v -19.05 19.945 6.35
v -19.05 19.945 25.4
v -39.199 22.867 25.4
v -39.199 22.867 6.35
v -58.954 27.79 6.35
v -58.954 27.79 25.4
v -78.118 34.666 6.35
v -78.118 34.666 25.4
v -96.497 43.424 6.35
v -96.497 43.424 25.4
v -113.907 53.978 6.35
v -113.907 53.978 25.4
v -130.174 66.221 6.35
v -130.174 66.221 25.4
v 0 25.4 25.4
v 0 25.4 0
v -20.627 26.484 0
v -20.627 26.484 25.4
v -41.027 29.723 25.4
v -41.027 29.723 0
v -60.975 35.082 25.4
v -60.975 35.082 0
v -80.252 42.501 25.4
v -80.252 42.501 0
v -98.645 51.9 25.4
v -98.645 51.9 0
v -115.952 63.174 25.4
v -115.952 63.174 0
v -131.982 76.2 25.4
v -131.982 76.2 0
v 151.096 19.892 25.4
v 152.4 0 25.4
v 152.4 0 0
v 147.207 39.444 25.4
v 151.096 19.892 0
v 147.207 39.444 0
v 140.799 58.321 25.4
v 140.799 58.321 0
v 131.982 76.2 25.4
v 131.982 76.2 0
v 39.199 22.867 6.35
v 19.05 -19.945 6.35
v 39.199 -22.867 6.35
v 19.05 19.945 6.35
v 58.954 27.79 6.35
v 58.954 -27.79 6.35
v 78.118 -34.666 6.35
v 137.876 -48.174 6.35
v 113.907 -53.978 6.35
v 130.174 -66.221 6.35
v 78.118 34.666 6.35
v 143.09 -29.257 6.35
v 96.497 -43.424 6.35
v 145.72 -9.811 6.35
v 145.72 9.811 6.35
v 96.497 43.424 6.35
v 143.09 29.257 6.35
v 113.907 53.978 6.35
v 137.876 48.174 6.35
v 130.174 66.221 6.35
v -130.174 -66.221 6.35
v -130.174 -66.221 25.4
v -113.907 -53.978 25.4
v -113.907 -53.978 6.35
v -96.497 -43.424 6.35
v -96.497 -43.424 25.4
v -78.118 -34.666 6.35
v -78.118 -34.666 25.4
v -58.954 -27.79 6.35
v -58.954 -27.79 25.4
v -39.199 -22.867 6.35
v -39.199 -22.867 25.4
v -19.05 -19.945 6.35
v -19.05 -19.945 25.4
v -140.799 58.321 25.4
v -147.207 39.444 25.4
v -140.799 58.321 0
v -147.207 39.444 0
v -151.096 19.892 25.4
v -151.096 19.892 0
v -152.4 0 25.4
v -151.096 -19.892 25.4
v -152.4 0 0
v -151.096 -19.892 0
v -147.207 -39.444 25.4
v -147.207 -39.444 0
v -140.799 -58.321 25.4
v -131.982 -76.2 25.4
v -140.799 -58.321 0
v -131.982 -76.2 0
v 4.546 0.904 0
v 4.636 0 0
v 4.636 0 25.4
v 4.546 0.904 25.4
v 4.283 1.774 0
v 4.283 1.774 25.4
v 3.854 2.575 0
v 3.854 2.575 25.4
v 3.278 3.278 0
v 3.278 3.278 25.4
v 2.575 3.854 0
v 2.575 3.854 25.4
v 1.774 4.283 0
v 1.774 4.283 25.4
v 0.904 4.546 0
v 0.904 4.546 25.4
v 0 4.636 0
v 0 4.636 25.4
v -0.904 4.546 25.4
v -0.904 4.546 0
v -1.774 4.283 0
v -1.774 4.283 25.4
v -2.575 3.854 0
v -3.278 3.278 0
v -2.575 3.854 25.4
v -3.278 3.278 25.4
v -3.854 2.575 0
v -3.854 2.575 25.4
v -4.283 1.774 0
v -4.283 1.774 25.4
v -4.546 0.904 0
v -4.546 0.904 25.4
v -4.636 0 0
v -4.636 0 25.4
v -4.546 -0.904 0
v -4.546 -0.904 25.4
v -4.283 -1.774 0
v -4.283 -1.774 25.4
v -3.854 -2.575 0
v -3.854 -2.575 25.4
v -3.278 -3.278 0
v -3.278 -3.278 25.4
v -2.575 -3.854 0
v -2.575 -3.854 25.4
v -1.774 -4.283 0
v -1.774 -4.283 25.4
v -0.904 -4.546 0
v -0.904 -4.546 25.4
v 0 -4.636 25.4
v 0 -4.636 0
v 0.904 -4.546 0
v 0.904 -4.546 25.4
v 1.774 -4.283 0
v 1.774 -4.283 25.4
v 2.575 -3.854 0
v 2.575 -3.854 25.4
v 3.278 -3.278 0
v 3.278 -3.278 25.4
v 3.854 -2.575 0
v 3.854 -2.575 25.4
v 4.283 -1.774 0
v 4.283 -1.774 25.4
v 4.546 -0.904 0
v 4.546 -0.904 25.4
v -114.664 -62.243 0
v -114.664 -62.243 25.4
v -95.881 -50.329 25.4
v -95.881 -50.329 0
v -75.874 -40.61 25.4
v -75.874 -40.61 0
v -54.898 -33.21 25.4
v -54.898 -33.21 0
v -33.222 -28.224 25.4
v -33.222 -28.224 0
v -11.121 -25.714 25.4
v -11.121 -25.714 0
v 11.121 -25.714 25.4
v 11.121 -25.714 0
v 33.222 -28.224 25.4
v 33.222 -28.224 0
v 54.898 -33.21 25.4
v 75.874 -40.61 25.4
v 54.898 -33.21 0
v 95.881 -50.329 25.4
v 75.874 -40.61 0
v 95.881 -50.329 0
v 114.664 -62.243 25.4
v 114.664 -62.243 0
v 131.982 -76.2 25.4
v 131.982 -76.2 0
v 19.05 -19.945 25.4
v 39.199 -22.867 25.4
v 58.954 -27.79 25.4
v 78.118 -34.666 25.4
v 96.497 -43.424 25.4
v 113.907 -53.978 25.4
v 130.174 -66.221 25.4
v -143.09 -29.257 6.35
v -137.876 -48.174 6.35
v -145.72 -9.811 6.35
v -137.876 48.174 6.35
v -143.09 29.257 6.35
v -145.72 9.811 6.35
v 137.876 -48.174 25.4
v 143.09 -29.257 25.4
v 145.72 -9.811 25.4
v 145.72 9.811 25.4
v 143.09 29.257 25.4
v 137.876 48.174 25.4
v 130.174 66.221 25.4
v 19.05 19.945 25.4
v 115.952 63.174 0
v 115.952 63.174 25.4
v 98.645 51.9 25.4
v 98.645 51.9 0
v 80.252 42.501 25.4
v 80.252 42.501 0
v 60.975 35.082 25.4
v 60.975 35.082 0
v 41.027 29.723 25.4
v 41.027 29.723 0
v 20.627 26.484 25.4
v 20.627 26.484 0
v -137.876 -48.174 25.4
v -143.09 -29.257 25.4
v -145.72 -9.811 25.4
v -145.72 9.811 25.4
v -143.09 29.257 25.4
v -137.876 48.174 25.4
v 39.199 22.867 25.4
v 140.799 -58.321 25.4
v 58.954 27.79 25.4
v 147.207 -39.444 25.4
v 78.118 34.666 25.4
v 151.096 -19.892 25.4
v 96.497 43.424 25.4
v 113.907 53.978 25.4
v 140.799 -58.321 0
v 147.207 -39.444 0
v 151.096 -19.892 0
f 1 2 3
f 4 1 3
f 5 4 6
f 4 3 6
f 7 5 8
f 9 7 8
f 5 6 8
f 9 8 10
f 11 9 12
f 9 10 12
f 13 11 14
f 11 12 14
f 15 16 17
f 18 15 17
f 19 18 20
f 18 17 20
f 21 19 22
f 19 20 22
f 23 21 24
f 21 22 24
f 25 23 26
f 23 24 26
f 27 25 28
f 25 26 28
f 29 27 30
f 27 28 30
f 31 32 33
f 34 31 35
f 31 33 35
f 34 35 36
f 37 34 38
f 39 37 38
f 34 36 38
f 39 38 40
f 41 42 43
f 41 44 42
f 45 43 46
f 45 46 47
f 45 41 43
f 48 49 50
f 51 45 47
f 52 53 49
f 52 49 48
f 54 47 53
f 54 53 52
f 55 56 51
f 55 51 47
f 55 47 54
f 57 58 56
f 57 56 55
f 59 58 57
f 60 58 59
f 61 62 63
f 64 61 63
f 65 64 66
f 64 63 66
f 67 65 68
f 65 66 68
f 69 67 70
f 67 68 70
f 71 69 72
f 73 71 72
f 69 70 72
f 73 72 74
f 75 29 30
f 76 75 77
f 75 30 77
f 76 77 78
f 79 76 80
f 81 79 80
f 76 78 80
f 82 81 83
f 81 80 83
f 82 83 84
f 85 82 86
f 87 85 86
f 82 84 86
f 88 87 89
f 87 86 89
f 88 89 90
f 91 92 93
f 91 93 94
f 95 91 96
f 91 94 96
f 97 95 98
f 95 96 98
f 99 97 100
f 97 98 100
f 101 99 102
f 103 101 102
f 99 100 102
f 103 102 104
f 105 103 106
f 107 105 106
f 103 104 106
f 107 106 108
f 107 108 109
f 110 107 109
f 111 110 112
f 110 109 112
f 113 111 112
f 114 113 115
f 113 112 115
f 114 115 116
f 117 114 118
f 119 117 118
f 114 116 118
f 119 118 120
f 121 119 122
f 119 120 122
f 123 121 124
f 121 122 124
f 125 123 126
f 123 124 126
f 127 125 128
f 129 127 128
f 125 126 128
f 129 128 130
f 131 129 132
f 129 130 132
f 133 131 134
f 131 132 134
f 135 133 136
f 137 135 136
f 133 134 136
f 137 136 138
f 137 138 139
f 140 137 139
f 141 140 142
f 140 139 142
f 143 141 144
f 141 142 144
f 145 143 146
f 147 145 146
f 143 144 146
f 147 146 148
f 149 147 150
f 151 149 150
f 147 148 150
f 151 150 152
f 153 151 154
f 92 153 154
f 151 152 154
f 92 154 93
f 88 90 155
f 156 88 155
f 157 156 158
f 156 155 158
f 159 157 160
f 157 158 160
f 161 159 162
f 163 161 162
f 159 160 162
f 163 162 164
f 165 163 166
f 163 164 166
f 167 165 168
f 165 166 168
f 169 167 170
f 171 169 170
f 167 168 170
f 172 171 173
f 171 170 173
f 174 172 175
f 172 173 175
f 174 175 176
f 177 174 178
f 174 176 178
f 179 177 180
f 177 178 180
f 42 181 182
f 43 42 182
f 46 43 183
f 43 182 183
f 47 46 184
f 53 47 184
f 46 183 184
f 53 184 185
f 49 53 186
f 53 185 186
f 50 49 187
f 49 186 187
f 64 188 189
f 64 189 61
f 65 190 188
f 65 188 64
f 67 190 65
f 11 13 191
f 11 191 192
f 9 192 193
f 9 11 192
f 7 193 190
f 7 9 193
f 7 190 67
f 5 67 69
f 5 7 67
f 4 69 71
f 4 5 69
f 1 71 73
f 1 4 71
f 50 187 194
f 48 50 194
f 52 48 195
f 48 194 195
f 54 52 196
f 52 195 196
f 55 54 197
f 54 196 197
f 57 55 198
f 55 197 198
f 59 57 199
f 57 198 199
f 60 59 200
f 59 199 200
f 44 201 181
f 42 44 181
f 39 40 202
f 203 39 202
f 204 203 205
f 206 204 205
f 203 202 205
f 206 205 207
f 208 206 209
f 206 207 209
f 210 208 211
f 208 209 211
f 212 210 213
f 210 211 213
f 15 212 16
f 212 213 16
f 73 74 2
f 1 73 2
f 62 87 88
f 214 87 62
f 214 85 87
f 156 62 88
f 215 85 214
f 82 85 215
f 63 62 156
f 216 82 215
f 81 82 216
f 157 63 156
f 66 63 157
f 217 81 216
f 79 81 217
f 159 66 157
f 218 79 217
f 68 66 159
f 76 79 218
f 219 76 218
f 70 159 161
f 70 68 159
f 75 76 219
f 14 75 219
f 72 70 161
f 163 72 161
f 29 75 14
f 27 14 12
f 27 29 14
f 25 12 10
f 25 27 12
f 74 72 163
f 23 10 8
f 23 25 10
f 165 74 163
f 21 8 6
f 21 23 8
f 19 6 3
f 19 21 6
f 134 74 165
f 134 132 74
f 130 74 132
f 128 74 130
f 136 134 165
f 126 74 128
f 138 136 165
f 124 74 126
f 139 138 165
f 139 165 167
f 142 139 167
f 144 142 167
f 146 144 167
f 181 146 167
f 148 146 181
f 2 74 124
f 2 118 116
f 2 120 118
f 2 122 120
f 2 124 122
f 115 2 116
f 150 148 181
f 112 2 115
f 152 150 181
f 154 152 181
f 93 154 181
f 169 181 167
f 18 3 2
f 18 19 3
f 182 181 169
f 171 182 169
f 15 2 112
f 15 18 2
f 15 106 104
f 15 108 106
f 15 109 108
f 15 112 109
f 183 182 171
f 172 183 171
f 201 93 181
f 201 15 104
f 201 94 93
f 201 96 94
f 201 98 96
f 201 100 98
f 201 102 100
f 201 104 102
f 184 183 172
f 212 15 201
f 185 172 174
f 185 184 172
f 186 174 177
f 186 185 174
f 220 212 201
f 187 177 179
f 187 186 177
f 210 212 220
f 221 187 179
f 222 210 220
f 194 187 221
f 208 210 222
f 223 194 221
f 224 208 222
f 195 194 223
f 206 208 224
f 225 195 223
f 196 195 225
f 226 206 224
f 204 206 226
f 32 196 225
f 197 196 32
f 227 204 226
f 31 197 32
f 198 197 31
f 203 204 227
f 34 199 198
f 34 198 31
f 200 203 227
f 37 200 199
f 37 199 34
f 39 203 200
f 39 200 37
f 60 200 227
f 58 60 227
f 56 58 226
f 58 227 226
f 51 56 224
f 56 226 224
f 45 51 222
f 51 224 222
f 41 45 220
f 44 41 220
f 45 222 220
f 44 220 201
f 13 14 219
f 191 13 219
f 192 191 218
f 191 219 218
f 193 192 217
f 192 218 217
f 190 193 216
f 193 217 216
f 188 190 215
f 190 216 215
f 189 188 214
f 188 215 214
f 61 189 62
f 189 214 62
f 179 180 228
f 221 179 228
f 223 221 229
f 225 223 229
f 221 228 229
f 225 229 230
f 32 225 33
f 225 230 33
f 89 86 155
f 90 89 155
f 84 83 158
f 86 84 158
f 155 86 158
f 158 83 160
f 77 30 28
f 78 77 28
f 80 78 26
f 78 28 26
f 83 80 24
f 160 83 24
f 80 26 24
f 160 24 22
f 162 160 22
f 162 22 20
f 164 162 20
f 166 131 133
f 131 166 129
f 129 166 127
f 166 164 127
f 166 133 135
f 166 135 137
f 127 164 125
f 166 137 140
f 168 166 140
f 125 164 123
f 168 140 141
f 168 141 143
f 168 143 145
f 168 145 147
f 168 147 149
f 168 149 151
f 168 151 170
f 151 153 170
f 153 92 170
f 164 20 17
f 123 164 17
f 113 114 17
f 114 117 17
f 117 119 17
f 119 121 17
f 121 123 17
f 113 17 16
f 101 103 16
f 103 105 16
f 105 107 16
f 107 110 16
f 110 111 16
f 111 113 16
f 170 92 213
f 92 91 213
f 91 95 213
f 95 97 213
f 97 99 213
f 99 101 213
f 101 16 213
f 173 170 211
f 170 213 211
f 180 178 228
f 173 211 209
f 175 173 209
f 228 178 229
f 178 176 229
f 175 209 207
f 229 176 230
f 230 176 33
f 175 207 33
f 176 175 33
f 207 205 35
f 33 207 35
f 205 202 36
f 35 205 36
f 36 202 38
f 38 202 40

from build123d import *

# Parameters (mm, degrees)
F1_DEPTH = 25.4
F3_DEPTH = 19.05
F4_R     = 4.6355
F5_DEPTH = 25.4


with BuildPart() as f1:
    # F0 (on Top) → F1 (new body)
    with BuildSketch(Plane.XY):
        with BuildLine():
            ThreePointArc((131.9822715367, -76.2), (147.2070959265, -39.4440224736), (152.4, 0))
            ThreePointArc((152.4, 0), (147.2070959265, 39.4440224736), (131.9822715368, 76.2))
            ThreePointArc((131.9822715367, 76.2), (70.7106074079, 38.5384530031), (0, 25.4))
            ThreePointArc((0, 25.4), (-70.7106074079, 38.5384530031), (-131.9822715367, 76.2))
            ThreePointArc((-131.9822715368, 76.2), (-152.4, 0), (-131.9822715367, -76.2))
            ThreePointArc((-131.9822715367, -76.2), (0, -25.4), (131.9822715367, -76.2))
        make_face()
    extrude(amount=F1_DEPTH)

    # F2 (on face) → F3 (cut)
    with BuildSketch(Plane.XY.offset(25.4)):
        with BuildLine():
            ThreePointArc((-19.05, 19.9449395097), (-78.1175048106, 34.6656311359), (-130.1742098035, 66.2214285714))
            ThreePointArc((-130.1742098035, 66.2214285714), (-146.05, 0), (-130.1742098035, -66.2214285714))
            ThreePointArc((-130.1742098035, -66.2214285714), (-78.1175048106, -34.6656311359), (-19.05, -19.9449395097))
            Line((-19.05, -19.9449395097), (-19.05, 0))
            Line((-19.05, 0), (-19.05, 19.9449395097))
        make_face()
        with BuildLine():
            ThreePointArc((19.05, -19.9449395097), (78.1175048106, -34.6656311359), (130.1742098035, -66.2214285714))
            ThreePointArc((130.1742098035, -66.2214285714), (146.05, 0), (130.1742098035, 66.2214285714))
            ThreePointArc((130.1742098035, 66.2214285714), (78.1175048106, 34.6656311359), (19.05, 19.9449395097))
            Line((19.05, 19.9449395097), (19.05, 0))
            Line((19.05, 0), (19.05, -19.9449395097))
        make_face()
    extrude(amount=-F3_DEPTH, mode=Mode.SUBTRACT)

    # F4 (on face) → F5 (cut, through all)
    with BuildSketch(Plane.XY.offset(25.4)):
        Circle(F4_R)
    extrude(amount=-F5_DEPTH, mode=Mode.SUBTRACT)


solid = f1.part
